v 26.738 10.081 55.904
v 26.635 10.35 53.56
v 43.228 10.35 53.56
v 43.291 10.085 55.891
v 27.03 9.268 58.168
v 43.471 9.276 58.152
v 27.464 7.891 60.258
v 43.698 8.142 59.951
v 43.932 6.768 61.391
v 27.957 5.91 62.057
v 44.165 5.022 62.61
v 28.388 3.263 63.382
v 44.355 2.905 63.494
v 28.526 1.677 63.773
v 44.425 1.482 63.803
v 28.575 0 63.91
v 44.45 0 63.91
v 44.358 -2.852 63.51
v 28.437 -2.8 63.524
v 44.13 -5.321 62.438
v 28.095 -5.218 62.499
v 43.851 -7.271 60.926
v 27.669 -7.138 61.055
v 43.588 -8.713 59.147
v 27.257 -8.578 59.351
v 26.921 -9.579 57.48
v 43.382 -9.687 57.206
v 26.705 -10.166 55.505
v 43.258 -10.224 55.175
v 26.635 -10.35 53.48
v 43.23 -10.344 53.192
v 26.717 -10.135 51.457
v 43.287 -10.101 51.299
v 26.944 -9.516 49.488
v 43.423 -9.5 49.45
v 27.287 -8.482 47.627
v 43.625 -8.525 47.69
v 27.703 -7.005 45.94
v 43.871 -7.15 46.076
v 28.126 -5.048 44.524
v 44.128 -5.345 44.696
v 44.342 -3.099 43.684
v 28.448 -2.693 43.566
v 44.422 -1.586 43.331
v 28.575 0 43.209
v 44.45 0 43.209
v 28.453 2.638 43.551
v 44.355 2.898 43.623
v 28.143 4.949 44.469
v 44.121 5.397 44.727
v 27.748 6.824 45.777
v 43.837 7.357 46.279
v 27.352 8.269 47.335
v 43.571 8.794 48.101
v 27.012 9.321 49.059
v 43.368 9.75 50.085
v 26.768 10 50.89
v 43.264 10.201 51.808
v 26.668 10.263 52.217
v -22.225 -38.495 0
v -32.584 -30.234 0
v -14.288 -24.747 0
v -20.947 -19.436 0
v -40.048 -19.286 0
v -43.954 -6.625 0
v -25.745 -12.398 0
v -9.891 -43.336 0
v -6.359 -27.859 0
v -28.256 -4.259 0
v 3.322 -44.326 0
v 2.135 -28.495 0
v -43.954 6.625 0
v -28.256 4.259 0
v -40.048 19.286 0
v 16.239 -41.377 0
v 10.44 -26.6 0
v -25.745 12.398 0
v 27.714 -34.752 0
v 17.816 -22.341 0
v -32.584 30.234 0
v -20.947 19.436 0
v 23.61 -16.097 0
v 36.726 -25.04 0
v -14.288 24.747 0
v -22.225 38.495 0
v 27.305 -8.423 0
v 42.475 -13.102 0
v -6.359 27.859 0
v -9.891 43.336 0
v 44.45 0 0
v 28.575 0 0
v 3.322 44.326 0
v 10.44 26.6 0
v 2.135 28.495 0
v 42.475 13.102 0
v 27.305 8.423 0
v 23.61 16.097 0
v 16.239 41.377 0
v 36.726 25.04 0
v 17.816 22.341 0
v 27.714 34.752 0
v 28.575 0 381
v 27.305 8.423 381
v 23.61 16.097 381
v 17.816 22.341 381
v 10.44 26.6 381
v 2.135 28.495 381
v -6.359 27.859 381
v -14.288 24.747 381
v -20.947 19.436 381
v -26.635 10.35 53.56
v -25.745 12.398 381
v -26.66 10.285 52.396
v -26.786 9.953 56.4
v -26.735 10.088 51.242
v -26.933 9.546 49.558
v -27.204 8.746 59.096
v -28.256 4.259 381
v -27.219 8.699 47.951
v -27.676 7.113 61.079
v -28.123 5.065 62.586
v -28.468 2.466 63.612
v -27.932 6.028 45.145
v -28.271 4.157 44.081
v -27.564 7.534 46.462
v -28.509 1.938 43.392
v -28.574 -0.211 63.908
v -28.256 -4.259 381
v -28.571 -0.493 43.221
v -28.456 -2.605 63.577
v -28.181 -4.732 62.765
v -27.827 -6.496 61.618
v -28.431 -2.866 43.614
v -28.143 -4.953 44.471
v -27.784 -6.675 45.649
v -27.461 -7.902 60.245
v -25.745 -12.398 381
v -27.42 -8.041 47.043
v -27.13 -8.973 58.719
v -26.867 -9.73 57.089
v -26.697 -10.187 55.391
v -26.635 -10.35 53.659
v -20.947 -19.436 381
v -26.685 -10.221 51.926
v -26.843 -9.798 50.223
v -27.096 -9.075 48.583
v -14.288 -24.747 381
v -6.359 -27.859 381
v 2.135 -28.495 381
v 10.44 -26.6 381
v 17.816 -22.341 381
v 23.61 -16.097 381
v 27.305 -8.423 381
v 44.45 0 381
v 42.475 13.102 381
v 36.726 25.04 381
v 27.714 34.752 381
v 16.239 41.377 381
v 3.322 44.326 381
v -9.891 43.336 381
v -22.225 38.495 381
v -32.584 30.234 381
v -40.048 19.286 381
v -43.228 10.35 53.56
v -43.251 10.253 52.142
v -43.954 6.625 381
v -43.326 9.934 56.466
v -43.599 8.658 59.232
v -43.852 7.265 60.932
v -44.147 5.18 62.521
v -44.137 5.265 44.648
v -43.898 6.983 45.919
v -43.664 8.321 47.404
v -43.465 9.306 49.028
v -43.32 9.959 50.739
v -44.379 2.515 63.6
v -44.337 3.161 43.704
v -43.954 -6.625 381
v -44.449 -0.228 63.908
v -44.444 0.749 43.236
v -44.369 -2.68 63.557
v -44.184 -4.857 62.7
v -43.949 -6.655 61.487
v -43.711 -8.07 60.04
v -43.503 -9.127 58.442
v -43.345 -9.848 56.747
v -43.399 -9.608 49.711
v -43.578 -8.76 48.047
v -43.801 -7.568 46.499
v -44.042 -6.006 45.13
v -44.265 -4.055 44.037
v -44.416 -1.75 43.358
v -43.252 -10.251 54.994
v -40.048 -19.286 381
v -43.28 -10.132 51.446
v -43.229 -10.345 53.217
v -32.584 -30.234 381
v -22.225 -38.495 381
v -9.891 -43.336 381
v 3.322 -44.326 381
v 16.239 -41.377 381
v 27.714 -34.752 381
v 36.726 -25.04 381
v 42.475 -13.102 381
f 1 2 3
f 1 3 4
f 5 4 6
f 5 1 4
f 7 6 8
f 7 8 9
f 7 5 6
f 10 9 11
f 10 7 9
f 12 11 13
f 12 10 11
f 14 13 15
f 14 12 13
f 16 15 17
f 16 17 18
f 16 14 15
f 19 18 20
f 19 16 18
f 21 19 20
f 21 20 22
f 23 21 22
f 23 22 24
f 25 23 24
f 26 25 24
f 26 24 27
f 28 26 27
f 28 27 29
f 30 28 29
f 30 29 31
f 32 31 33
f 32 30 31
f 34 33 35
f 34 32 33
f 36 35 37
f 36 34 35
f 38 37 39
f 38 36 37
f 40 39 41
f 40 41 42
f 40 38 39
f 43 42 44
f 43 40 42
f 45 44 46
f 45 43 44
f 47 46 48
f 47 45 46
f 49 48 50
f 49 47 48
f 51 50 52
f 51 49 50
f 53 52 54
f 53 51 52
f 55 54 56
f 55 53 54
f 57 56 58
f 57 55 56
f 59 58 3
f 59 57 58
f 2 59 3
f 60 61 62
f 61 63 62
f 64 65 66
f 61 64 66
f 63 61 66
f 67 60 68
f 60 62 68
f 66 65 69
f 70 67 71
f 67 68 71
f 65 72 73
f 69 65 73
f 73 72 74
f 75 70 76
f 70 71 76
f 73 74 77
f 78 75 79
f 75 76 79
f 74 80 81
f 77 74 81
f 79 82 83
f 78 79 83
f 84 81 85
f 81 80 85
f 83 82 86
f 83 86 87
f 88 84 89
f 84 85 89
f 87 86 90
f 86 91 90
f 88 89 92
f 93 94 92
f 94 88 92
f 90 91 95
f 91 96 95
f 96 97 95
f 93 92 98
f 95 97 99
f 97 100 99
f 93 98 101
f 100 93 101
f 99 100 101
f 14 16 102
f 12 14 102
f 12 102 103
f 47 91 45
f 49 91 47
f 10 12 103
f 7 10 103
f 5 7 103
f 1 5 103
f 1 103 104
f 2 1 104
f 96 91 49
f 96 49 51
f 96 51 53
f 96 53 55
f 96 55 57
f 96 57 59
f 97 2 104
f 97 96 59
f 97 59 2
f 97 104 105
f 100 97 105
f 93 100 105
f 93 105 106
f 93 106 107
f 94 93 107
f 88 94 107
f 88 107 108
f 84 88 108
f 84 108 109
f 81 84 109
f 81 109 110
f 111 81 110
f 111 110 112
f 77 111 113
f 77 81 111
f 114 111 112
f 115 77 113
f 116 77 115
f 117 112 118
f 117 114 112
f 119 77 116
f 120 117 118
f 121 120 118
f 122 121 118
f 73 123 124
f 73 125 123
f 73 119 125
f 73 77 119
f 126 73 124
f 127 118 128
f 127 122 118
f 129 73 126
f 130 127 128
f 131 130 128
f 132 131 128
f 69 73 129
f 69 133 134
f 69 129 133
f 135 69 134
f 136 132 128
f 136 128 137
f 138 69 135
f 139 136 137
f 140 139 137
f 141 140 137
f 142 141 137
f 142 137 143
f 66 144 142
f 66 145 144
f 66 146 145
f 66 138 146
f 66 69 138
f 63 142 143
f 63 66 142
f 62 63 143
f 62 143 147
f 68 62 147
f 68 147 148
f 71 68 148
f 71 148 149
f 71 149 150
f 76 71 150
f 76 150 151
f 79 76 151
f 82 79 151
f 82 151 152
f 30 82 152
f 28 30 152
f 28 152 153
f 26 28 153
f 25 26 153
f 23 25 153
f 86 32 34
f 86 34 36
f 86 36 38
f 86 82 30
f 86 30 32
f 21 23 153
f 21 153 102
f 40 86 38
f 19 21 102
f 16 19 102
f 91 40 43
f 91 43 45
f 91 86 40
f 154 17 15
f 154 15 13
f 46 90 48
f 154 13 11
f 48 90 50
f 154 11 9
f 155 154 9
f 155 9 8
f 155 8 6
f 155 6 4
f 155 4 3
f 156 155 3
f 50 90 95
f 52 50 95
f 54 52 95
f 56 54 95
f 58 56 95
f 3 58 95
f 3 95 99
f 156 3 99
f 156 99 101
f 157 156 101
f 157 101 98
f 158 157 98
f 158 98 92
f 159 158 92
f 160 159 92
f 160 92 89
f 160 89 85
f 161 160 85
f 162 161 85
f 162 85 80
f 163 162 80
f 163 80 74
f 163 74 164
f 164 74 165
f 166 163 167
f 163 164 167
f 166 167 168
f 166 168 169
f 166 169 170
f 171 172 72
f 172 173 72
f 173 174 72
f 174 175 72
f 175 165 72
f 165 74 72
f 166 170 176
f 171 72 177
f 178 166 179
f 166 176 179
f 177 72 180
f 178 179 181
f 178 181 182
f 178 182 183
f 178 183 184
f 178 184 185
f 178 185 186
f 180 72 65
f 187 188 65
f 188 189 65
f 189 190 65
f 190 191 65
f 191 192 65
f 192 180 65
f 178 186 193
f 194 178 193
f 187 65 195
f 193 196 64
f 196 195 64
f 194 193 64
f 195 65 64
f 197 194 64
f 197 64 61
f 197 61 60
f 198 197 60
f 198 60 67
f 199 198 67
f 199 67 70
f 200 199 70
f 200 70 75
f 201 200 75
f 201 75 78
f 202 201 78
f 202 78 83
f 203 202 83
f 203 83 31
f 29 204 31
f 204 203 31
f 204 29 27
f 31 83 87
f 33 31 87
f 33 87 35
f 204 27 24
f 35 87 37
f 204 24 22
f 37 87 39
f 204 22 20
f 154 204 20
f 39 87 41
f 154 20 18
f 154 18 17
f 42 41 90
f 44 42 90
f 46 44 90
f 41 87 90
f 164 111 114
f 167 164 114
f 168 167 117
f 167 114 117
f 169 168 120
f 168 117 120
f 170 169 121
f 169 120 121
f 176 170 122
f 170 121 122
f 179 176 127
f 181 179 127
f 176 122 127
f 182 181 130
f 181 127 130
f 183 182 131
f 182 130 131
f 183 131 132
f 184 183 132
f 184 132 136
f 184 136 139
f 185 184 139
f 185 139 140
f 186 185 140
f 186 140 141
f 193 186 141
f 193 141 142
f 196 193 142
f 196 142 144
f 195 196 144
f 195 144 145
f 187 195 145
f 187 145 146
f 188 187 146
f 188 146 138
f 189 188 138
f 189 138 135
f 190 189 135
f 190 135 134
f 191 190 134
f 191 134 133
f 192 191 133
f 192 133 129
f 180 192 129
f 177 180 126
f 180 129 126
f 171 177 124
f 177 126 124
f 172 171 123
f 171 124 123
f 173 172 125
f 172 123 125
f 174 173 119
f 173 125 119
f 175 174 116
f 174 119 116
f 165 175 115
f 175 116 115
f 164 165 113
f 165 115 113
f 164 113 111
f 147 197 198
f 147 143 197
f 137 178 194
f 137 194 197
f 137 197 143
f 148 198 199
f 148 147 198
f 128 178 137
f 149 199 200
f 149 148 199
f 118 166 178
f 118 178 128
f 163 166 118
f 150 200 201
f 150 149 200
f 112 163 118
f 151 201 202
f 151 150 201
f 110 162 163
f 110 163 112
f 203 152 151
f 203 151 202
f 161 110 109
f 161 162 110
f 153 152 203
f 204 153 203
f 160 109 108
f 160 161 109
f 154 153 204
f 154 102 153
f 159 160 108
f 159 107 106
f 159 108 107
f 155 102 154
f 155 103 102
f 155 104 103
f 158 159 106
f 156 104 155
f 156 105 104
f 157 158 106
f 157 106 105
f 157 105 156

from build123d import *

# Parameters (mm, degrees)
F0_R     = 44.45
F0_R_2   = 28.575
F1_DEPTH = 381
F2_R     = 10.3505
F3_DEPTH = 119.888
F4_DEPTH = 65.786


with BuildPart() as f1:
    # F0 (on Top) → F1 (new body)
    with BuildSketch(Plane.XY):
        Circle(F0_R)
        Circle(F0_R_2, mode=Mode.SUBTRACT)
    extrude(amount=F1_DEPTH)

    # F2 (on Right) → F3 (cut)
    with BuildSketch(Plane.YZ):
        with Locations((0, 53.559698)):
            Circle(F2_R)
    extrude(amount=-F3_DEPTH, mode=Mode.SUBTRACT)

    # F2 (on Right) → F4 (cut)
    with BuildSketch(Plane.YZ):
        with Locations((0, 53.559698)):
            Circle(F2_R)
    extrude(amount=F4_DEPTH, mode=Mode.SUBTRACT)


solid = f1.part
